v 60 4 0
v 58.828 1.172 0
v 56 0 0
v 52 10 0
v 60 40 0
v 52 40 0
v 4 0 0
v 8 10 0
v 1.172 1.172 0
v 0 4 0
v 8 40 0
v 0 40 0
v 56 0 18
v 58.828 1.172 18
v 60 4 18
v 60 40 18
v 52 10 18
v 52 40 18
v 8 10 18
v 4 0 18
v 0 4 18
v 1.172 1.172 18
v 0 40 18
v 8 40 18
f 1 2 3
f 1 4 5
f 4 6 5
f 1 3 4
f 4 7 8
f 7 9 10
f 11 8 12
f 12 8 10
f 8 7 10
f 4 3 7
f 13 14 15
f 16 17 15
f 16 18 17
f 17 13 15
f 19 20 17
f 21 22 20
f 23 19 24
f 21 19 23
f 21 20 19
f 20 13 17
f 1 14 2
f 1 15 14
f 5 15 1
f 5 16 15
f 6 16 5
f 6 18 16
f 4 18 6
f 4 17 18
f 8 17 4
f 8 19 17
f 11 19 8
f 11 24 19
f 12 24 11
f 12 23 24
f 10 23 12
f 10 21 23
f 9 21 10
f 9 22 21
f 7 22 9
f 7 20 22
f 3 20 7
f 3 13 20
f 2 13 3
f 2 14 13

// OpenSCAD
$fn = 32;

// ----------------------------------------------------------------------
// Heat sink frame: 60 x 40 mm frame, 8 mm walls
// ----------------------------------------------------------------------

// --- parameters (mm) ---
profile_height = 18;      // extrusion height
profile_points = 12;      // points of the closed outline

profile = [[0, 4], [1.172, 1.172], [4, 0], [56, 0], [58.828, 1.172], [60, 4], [60, 40], [52, 40], [52, 10], [8, 10], [8, 40], [0, 40]];  // single closed polygon, 12 points, counter clockwise

// --- the one profile operation ---
linear_extrude(height = profile_height) polygon(points = profile);
